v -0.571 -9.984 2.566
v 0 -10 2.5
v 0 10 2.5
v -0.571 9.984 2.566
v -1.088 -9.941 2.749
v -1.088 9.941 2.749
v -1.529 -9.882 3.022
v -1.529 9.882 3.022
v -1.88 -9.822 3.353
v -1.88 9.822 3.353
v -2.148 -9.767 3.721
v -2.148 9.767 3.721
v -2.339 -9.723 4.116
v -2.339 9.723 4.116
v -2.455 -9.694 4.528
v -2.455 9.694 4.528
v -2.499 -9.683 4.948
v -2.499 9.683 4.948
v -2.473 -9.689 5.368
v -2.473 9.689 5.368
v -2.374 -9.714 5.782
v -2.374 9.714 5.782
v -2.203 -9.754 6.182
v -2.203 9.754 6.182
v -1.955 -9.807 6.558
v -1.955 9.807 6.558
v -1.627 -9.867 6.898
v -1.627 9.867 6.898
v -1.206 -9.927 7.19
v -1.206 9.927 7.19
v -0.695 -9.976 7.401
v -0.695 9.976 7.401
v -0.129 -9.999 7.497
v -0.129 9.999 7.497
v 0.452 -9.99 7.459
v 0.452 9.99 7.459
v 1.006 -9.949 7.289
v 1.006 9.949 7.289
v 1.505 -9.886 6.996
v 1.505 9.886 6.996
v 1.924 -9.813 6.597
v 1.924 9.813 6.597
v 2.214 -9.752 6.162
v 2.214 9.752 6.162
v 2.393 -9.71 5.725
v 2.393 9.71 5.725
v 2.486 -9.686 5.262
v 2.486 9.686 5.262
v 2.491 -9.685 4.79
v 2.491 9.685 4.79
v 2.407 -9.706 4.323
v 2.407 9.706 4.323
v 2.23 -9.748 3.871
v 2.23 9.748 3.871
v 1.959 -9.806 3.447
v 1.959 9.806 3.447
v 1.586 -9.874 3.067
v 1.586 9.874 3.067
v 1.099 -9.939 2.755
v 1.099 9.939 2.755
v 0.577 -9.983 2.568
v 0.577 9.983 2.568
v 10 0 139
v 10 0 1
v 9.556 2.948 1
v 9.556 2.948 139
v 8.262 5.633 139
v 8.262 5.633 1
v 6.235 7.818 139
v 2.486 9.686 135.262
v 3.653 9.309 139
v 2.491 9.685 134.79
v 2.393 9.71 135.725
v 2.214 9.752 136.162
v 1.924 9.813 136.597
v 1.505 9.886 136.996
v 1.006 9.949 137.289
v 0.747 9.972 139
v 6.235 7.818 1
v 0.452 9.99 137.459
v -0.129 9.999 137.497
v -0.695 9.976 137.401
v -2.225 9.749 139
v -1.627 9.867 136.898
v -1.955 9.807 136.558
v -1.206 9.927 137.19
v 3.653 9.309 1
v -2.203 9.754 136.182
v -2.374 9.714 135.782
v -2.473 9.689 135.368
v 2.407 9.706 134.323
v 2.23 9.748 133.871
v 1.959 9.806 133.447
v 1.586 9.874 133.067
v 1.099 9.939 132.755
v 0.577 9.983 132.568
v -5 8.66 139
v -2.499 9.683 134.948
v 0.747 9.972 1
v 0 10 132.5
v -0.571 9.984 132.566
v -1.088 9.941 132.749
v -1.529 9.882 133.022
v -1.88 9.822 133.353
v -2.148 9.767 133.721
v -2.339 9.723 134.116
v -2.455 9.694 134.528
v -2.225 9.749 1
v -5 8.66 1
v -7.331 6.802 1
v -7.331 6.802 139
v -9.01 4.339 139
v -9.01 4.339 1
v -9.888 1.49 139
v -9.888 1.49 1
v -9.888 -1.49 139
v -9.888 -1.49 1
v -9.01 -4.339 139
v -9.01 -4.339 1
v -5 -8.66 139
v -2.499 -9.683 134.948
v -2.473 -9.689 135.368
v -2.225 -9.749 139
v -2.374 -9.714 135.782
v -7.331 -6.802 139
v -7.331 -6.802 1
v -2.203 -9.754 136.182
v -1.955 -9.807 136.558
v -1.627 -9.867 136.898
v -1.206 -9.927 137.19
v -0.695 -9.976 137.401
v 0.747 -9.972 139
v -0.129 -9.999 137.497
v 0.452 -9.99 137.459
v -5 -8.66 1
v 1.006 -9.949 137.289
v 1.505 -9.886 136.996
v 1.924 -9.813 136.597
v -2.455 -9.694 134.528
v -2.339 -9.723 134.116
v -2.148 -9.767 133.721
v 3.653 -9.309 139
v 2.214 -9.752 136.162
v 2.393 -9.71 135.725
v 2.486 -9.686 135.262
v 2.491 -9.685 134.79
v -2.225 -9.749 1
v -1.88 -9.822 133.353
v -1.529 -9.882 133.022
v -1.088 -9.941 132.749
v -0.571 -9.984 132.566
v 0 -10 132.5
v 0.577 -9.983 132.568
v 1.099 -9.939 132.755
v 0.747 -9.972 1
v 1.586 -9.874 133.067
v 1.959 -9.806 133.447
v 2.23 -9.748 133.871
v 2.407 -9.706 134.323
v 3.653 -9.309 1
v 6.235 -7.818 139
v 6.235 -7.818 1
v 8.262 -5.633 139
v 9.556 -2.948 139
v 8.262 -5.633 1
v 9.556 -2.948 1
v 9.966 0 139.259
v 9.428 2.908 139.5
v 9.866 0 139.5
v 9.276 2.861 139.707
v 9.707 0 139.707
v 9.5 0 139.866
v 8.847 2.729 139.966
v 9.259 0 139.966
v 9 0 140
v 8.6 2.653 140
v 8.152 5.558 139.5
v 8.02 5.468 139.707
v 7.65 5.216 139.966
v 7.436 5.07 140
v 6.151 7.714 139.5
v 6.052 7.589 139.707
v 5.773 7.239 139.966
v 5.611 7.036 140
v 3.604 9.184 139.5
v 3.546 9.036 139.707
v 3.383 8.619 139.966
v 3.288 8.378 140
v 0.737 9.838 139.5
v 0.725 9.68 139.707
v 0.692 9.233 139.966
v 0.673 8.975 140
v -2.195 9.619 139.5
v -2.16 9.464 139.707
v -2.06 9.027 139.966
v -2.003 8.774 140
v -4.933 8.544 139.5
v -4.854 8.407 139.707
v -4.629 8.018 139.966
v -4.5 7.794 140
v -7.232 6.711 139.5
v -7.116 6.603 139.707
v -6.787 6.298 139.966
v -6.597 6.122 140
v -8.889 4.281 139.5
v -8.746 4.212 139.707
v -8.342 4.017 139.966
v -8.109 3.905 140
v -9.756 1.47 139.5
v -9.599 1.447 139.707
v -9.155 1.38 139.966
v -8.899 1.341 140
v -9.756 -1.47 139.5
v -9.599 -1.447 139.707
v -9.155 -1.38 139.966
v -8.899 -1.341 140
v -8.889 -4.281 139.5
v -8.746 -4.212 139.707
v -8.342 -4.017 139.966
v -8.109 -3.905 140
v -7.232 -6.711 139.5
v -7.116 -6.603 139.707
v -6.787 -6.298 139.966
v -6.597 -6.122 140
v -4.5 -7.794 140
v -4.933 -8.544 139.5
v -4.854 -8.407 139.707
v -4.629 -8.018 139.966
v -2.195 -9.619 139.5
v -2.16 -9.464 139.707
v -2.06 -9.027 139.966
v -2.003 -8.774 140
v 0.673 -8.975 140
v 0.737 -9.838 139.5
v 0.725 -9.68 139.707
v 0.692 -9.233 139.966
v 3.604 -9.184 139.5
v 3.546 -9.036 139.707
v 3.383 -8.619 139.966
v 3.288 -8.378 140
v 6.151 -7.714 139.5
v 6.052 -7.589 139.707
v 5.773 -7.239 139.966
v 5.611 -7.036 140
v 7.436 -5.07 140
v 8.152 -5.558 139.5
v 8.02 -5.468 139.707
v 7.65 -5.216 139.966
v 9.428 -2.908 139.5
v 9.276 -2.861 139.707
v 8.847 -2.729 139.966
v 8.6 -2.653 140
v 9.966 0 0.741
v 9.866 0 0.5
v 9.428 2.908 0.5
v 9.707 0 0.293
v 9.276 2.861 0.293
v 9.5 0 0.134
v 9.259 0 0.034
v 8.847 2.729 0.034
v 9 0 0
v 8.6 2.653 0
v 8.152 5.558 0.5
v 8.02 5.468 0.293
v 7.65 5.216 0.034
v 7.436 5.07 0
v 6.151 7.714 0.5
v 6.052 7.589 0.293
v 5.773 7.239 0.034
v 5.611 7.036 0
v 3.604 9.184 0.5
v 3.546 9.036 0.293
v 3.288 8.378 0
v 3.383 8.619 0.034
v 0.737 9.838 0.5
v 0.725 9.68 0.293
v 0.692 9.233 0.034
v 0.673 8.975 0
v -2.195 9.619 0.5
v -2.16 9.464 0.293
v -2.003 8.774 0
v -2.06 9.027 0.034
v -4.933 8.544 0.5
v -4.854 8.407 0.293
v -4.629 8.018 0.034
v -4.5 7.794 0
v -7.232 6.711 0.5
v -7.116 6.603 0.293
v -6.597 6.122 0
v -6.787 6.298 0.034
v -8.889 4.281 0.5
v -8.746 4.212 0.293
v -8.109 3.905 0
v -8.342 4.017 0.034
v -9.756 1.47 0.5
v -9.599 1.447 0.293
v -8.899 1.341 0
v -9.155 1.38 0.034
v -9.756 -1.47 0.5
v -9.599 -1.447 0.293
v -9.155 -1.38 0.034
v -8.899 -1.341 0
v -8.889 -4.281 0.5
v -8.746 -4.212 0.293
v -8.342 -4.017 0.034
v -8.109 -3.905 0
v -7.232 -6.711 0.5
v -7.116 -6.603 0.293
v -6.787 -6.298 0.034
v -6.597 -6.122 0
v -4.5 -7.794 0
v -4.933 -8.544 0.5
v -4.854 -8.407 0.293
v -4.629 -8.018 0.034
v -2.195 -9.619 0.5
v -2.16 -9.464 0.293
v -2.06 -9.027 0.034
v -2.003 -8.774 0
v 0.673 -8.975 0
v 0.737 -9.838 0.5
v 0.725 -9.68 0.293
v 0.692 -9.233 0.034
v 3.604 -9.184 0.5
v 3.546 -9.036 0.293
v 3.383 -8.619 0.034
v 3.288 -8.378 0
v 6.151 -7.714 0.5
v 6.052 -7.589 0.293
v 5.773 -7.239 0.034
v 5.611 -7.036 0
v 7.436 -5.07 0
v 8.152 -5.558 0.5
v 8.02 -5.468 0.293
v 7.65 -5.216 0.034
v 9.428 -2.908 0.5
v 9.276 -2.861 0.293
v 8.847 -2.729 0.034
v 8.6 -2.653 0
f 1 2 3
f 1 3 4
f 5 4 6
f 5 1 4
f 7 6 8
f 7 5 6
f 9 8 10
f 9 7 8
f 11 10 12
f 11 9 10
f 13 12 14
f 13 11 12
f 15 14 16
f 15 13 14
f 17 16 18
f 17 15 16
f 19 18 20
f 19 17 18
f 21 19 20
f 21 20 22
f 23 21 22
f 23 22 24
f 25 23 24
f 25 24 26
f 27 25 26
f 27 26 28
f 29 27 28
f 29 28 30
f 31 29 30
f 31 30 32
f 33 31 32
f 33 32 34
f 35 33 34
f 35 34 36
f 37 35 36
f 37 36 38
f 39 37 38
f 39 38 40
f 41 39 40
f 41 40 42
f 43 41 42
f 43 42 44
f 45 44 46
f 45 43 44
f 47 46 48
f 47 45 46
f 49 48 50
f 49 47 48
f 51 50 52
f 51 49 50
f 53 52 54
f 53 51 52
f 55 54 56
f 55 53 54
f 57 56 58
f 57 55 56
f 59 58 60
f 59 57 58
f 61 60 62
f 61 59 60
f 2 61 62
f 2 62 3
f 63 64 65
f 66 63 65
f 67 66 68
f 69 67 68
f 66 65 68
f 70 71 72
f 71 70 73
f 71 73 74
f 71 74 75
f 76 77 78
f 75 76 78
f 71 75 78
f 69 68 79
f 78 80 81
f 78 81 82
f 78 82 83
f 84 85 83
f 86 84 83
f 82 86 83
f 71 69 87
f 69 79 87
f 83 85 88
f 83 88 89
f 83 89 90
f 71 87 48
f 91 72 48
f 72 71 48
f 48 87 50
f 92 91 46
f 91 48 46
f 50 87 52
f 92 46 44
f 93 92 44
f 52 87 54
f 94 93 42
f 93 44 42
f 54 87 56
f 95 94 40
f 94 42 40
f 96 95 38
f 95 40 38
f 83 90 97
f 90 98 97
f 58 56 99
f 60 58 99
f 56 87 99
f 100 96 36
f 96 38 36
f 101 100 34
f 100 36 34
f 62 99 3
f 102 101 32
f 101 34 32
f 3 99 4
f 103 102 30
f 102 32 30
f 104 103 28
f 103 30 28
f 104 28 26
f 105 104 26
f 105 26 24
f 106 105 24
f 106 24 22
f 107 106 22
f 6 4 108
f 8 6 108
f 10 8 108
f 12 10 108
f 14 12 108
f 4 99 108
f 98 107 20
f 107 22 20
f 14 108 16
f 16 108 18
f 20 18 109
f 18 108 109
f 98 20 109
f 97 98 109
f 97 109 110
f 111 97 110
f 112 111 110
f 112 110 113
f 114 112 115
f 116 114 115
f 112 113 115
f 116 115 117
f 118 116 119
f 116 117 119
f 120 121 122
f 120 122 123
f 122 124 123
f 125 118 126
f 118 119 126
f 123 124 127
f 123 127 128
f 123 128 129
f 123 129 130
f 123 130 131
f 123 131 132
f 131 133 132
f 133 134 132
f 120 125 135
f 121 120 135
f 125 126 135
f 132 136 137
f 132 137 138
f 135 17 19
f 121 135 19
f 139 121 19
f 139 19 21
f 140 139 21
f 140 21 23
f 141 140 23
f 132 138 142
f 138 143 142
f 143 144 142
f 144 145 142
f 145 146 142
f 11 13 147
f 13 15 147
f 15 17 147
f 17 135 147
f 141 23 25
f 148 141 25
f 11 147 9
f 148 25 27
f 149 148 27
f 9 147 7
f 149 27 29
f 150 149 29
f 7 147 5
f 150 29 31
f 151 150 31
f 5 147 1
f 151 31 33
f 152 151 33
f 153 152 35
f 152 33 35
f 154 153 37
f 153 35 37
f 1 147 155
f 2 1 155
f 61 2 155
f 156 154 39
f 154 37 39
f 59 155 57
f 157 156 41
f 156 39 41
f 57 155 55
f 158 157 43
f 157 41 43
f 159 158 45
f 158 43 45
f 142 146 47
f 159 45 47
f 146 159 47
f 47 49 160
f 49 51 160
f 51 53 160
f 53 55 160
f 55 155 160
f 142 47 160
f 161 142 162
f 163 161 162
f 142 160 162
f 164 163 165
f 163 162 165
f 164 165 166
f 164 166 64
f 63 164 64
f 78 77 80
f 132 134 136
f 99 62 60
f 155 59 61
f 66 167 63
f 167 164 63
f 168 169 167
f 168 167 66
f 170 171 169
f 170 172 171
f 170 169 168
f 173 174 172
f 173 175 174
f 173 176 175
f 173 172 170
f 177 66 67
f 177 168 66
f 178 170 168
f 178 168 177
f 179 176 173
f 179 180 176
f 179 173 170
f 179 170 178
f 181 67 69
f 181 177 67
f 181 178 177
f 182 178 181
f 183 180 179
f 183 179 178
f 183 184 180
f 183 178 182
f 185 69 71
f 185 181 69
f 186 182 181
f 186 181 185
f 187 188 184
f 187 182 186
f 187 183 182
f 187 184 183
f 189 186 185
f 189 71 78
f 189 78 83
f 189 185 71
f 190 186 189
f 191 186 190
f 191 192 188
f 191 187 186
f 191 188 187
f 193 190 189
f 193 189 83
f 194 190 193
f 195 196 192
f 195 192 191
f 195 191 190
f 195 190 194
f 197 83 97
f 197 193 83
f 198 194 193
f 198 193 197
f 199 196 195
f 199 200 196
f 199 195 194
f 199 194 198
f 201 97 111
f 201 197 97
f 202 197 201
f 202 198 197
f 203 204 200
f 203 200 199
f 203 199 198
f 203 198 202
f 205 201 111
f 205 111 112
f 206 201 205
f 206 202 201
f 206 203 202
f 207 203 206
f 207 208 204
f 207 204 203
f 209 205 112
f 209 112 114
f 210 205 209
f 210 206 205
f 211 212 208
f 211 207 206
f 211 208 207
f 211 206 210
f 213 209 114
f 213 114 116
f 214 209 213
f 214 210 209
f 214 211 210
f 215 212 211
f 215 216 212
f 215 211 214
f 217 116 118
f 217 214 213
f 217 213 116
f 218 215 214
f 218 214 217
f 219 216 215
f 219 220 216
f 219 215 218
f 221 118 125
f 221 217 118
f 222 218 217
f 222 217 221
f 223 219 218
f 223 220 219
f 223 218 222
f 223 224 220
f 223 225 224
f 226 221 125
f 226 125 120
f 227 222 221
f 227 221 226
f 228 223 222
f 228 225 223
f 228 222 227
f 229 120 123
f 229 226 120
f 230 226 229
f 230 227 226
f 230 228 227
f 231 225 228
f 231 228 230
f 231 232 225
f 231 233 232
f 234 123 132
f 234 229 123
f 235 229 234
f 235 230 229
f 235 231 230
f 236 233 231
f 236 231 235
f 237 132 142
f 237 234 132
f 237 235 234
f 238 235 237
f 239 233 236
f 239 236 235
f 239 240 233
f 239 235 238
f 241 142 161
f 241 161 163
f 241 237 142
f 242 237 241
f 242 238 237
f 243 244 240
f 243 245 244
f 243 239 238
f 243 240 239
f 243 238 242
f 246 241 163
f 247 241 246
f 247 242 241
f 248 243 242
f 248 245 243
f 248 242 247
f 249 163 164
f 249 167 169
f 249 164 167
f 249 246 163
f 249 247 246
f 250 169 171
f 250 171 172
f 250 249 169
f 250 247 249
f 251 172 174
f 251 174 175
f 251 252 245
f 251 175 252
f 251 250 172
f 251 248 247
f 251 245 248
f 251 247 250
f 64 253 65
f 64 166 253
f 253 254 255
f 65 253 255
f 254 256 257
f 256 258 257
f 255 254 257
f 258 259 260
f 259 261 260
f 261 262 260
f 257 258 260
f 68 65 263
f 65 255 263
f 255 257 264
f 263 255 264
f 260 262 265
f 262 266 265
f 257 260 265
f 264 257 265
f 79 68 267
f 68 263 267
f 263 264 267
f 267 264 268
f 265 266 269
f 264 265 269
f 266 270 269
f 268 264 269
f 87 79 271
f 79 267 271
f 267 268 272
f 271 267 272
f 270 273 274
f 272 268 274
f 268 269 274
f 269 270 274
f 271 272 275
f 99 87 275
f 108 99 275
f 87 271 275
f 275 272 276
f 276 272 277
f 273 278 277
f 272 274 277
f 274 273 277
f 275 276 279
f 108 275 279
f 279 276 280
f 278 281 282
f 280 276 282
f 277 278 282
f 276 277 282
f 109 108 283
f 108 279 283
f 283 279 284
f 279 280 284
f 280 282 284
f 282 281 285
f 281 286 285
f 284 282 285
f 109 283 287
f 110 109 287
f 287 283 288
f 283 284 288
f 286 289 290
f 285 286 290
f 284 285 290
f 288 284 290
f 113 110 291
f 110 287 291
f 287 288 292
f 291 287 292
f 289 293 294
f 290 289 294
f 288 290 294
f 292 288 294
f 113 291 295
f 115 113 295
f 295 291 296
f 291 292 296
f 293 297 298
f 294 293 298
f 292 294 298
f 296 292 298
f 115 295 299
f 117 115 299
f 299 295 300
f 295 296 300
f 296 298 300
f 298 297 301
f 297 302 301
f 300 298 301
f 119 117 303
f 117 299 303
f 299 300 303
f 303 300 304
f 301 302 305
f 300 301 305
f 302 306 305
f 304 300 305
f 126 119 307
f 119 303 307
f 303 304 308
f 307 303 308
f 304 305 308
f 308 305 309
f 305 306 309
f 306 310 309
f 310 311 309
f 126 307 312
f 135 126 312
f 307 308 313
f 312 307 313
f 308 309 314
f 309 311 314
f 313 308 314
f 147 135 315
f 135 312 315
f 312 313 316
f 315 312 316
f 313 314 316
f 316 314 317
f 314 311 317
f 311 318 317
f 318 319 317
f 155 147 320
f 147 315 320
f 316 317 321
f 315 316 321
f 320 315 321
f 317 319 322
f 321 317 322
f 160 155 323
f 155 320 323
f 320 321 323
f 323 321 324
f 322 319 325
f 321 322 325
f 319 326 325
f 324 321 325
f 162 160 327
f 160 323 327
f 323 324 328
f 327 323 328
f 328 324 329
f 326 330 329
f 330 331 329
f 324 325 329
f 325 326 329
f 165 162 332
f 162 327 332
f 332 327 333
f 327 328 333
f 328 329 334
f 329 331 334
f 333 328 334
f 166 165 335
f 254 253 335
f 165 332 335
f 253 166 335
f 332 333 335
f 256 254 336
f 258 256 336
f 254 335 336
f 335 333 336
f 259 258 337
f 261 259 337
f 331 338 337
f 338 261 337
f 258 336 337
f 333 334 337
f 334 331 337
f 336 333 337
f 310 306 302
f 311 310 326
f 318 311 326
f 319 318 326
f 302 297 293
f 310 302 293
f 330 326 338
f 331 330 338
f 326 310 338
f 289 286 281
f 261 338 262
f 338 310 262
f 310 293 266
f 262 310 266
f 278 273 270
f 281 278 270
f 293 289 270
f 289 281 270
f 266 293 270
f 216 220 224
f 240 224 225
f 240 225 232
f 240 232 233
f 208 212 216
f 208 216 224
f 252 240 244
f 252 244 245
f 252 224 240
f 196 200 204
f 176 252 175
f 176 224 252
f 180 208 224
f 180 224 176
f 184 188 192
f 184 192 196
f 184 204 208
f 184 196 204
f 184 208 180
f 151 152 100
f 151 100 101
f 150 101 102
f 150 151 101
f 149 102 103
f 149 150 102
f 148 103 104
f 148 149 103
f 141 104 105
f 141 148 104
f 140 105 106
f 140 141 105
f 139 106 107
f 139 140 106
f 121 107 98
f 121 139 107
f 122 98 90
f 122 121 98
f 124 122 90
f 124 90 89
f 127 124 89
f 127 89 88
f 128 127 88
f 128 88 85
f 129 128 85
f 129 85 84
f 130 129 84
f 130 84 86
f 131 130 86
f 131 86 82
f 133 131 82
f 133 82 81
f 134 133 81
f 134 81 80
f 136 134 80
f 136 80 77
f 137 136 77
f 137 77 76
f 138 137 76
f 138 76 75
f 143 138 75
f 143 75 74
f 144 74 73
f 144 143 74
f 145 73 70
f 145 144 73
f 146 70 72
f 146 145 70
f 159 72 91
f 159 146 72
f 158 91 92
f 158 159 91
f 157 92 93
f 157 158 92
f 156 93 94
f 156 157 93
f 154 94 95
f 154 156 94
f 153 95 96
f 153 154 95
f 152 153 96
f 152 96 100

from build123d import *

# Parameters (mm, degrees)
SKETCH1_R               = 10
BOSS_EXTRUDE1_DEPTH     = 140
FILLET1_R               = 1
CUT_EXTRUDE1_DEPTH      = 140
CUT_EXTRUDE1_DEPTH_BACK = 140
SKETCH2_R               = 2.5


with BuildPart() as part:
    # Sketch1 → Boss-Extrude1 (new body)
    with BuildSketch(Plane.XY):
        Circle(SKETCH1_R)
    extrude(amount=BOSS_EXTRUDE1_DEPTH)

    # Fillet1
    fillet1_edges = [part.edges().sort_by_distance(p)[0] for p in [
        (-10, 0, 0),
        (-10, 0, 140),
    ]]
    fillet(fillet1_edges, radius=FILLET1_R)

    # Sketch2 → Cut-Extrude1 (cut, two sides: drawn at the far end of the back side and taken through both)
    with BuildSketch(Plane(origin=(0, 0, 0), x_dir=(1, 0, 0), z_dir=(0, 1, 0)).offset(-CUT_EXTRUDE1_DEPTH_BACK)):
        with Locations((0, -5)):
            Circle(SKETCH2_R)
        with Locations((0, -135)):
            Circle(SKETCH2_R)
    extrude(amount=CUT_EXTRUDE1_DEPTH + CUT_EXTRUDE1_DEPTH_BACK, mode=Mode.SUBTRACT)


solid = part.part
